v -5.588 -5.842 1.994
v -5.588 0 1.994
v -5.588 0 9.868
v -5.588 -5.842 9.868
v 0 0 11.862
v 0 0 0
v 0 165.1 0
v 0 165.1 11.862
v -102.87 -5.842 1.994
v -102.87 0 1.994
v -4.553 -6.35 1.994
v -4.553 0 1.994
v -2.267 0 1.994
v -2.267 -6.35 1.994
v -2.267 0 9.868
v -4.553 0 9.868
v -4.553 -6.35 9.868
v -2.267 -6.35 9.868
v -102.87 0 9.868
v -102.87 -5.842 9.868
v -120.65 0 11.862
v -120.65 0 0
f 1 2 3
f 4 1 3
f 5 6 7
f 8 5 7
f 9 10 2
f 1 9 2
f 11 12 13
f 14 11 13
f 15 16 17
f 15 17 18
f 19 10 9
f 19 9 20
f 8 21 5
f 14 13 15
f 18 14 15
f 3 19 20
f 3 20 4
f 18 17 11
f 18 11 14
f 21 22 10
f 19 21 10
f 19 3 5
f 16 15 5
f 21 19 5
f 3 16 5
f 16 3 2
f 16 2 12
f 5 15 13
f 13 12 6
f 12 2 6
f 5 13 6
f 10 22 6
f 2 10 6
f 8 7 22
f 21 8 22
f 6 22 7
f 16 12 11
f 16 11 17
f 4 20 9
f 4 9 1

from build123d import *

# Parameters (mm, degrees)
F1_DEPTH = 11.8618
F2_W     = 97.282
F2_H     = 7.874
F3_DEPTH = 5.842
F4_W     = 2.286
F4_H     = 7.874
F5_DEPTH = 6.35


with BuildPart() as f1:
    # F0 (on Top) → F1 (new body)
    with BuildSketch(Plane.XY):
        Polygon((-120.65, 0), (0, 0), (0, 165.1), align=None)
    extrude(amount=F1_DEPTH)

    # F2 (on face) → F3 (join)
    with BuildSketch(Plane.XZ):
        with Locations((-54.229, 5.9309)):
            Rectangle(F2_W, F2_H)
    extrude(amount=F3_DEPTH)

    # F4 (on face) → F5 (join)
    with BuildSketch(Plane.XZ):
        with Locations((-3.41022, 5.9309)):
            Rectangle(F4_W, F4_H)
    extrude(amount=F5_DEPTH)


solid = f1.part
